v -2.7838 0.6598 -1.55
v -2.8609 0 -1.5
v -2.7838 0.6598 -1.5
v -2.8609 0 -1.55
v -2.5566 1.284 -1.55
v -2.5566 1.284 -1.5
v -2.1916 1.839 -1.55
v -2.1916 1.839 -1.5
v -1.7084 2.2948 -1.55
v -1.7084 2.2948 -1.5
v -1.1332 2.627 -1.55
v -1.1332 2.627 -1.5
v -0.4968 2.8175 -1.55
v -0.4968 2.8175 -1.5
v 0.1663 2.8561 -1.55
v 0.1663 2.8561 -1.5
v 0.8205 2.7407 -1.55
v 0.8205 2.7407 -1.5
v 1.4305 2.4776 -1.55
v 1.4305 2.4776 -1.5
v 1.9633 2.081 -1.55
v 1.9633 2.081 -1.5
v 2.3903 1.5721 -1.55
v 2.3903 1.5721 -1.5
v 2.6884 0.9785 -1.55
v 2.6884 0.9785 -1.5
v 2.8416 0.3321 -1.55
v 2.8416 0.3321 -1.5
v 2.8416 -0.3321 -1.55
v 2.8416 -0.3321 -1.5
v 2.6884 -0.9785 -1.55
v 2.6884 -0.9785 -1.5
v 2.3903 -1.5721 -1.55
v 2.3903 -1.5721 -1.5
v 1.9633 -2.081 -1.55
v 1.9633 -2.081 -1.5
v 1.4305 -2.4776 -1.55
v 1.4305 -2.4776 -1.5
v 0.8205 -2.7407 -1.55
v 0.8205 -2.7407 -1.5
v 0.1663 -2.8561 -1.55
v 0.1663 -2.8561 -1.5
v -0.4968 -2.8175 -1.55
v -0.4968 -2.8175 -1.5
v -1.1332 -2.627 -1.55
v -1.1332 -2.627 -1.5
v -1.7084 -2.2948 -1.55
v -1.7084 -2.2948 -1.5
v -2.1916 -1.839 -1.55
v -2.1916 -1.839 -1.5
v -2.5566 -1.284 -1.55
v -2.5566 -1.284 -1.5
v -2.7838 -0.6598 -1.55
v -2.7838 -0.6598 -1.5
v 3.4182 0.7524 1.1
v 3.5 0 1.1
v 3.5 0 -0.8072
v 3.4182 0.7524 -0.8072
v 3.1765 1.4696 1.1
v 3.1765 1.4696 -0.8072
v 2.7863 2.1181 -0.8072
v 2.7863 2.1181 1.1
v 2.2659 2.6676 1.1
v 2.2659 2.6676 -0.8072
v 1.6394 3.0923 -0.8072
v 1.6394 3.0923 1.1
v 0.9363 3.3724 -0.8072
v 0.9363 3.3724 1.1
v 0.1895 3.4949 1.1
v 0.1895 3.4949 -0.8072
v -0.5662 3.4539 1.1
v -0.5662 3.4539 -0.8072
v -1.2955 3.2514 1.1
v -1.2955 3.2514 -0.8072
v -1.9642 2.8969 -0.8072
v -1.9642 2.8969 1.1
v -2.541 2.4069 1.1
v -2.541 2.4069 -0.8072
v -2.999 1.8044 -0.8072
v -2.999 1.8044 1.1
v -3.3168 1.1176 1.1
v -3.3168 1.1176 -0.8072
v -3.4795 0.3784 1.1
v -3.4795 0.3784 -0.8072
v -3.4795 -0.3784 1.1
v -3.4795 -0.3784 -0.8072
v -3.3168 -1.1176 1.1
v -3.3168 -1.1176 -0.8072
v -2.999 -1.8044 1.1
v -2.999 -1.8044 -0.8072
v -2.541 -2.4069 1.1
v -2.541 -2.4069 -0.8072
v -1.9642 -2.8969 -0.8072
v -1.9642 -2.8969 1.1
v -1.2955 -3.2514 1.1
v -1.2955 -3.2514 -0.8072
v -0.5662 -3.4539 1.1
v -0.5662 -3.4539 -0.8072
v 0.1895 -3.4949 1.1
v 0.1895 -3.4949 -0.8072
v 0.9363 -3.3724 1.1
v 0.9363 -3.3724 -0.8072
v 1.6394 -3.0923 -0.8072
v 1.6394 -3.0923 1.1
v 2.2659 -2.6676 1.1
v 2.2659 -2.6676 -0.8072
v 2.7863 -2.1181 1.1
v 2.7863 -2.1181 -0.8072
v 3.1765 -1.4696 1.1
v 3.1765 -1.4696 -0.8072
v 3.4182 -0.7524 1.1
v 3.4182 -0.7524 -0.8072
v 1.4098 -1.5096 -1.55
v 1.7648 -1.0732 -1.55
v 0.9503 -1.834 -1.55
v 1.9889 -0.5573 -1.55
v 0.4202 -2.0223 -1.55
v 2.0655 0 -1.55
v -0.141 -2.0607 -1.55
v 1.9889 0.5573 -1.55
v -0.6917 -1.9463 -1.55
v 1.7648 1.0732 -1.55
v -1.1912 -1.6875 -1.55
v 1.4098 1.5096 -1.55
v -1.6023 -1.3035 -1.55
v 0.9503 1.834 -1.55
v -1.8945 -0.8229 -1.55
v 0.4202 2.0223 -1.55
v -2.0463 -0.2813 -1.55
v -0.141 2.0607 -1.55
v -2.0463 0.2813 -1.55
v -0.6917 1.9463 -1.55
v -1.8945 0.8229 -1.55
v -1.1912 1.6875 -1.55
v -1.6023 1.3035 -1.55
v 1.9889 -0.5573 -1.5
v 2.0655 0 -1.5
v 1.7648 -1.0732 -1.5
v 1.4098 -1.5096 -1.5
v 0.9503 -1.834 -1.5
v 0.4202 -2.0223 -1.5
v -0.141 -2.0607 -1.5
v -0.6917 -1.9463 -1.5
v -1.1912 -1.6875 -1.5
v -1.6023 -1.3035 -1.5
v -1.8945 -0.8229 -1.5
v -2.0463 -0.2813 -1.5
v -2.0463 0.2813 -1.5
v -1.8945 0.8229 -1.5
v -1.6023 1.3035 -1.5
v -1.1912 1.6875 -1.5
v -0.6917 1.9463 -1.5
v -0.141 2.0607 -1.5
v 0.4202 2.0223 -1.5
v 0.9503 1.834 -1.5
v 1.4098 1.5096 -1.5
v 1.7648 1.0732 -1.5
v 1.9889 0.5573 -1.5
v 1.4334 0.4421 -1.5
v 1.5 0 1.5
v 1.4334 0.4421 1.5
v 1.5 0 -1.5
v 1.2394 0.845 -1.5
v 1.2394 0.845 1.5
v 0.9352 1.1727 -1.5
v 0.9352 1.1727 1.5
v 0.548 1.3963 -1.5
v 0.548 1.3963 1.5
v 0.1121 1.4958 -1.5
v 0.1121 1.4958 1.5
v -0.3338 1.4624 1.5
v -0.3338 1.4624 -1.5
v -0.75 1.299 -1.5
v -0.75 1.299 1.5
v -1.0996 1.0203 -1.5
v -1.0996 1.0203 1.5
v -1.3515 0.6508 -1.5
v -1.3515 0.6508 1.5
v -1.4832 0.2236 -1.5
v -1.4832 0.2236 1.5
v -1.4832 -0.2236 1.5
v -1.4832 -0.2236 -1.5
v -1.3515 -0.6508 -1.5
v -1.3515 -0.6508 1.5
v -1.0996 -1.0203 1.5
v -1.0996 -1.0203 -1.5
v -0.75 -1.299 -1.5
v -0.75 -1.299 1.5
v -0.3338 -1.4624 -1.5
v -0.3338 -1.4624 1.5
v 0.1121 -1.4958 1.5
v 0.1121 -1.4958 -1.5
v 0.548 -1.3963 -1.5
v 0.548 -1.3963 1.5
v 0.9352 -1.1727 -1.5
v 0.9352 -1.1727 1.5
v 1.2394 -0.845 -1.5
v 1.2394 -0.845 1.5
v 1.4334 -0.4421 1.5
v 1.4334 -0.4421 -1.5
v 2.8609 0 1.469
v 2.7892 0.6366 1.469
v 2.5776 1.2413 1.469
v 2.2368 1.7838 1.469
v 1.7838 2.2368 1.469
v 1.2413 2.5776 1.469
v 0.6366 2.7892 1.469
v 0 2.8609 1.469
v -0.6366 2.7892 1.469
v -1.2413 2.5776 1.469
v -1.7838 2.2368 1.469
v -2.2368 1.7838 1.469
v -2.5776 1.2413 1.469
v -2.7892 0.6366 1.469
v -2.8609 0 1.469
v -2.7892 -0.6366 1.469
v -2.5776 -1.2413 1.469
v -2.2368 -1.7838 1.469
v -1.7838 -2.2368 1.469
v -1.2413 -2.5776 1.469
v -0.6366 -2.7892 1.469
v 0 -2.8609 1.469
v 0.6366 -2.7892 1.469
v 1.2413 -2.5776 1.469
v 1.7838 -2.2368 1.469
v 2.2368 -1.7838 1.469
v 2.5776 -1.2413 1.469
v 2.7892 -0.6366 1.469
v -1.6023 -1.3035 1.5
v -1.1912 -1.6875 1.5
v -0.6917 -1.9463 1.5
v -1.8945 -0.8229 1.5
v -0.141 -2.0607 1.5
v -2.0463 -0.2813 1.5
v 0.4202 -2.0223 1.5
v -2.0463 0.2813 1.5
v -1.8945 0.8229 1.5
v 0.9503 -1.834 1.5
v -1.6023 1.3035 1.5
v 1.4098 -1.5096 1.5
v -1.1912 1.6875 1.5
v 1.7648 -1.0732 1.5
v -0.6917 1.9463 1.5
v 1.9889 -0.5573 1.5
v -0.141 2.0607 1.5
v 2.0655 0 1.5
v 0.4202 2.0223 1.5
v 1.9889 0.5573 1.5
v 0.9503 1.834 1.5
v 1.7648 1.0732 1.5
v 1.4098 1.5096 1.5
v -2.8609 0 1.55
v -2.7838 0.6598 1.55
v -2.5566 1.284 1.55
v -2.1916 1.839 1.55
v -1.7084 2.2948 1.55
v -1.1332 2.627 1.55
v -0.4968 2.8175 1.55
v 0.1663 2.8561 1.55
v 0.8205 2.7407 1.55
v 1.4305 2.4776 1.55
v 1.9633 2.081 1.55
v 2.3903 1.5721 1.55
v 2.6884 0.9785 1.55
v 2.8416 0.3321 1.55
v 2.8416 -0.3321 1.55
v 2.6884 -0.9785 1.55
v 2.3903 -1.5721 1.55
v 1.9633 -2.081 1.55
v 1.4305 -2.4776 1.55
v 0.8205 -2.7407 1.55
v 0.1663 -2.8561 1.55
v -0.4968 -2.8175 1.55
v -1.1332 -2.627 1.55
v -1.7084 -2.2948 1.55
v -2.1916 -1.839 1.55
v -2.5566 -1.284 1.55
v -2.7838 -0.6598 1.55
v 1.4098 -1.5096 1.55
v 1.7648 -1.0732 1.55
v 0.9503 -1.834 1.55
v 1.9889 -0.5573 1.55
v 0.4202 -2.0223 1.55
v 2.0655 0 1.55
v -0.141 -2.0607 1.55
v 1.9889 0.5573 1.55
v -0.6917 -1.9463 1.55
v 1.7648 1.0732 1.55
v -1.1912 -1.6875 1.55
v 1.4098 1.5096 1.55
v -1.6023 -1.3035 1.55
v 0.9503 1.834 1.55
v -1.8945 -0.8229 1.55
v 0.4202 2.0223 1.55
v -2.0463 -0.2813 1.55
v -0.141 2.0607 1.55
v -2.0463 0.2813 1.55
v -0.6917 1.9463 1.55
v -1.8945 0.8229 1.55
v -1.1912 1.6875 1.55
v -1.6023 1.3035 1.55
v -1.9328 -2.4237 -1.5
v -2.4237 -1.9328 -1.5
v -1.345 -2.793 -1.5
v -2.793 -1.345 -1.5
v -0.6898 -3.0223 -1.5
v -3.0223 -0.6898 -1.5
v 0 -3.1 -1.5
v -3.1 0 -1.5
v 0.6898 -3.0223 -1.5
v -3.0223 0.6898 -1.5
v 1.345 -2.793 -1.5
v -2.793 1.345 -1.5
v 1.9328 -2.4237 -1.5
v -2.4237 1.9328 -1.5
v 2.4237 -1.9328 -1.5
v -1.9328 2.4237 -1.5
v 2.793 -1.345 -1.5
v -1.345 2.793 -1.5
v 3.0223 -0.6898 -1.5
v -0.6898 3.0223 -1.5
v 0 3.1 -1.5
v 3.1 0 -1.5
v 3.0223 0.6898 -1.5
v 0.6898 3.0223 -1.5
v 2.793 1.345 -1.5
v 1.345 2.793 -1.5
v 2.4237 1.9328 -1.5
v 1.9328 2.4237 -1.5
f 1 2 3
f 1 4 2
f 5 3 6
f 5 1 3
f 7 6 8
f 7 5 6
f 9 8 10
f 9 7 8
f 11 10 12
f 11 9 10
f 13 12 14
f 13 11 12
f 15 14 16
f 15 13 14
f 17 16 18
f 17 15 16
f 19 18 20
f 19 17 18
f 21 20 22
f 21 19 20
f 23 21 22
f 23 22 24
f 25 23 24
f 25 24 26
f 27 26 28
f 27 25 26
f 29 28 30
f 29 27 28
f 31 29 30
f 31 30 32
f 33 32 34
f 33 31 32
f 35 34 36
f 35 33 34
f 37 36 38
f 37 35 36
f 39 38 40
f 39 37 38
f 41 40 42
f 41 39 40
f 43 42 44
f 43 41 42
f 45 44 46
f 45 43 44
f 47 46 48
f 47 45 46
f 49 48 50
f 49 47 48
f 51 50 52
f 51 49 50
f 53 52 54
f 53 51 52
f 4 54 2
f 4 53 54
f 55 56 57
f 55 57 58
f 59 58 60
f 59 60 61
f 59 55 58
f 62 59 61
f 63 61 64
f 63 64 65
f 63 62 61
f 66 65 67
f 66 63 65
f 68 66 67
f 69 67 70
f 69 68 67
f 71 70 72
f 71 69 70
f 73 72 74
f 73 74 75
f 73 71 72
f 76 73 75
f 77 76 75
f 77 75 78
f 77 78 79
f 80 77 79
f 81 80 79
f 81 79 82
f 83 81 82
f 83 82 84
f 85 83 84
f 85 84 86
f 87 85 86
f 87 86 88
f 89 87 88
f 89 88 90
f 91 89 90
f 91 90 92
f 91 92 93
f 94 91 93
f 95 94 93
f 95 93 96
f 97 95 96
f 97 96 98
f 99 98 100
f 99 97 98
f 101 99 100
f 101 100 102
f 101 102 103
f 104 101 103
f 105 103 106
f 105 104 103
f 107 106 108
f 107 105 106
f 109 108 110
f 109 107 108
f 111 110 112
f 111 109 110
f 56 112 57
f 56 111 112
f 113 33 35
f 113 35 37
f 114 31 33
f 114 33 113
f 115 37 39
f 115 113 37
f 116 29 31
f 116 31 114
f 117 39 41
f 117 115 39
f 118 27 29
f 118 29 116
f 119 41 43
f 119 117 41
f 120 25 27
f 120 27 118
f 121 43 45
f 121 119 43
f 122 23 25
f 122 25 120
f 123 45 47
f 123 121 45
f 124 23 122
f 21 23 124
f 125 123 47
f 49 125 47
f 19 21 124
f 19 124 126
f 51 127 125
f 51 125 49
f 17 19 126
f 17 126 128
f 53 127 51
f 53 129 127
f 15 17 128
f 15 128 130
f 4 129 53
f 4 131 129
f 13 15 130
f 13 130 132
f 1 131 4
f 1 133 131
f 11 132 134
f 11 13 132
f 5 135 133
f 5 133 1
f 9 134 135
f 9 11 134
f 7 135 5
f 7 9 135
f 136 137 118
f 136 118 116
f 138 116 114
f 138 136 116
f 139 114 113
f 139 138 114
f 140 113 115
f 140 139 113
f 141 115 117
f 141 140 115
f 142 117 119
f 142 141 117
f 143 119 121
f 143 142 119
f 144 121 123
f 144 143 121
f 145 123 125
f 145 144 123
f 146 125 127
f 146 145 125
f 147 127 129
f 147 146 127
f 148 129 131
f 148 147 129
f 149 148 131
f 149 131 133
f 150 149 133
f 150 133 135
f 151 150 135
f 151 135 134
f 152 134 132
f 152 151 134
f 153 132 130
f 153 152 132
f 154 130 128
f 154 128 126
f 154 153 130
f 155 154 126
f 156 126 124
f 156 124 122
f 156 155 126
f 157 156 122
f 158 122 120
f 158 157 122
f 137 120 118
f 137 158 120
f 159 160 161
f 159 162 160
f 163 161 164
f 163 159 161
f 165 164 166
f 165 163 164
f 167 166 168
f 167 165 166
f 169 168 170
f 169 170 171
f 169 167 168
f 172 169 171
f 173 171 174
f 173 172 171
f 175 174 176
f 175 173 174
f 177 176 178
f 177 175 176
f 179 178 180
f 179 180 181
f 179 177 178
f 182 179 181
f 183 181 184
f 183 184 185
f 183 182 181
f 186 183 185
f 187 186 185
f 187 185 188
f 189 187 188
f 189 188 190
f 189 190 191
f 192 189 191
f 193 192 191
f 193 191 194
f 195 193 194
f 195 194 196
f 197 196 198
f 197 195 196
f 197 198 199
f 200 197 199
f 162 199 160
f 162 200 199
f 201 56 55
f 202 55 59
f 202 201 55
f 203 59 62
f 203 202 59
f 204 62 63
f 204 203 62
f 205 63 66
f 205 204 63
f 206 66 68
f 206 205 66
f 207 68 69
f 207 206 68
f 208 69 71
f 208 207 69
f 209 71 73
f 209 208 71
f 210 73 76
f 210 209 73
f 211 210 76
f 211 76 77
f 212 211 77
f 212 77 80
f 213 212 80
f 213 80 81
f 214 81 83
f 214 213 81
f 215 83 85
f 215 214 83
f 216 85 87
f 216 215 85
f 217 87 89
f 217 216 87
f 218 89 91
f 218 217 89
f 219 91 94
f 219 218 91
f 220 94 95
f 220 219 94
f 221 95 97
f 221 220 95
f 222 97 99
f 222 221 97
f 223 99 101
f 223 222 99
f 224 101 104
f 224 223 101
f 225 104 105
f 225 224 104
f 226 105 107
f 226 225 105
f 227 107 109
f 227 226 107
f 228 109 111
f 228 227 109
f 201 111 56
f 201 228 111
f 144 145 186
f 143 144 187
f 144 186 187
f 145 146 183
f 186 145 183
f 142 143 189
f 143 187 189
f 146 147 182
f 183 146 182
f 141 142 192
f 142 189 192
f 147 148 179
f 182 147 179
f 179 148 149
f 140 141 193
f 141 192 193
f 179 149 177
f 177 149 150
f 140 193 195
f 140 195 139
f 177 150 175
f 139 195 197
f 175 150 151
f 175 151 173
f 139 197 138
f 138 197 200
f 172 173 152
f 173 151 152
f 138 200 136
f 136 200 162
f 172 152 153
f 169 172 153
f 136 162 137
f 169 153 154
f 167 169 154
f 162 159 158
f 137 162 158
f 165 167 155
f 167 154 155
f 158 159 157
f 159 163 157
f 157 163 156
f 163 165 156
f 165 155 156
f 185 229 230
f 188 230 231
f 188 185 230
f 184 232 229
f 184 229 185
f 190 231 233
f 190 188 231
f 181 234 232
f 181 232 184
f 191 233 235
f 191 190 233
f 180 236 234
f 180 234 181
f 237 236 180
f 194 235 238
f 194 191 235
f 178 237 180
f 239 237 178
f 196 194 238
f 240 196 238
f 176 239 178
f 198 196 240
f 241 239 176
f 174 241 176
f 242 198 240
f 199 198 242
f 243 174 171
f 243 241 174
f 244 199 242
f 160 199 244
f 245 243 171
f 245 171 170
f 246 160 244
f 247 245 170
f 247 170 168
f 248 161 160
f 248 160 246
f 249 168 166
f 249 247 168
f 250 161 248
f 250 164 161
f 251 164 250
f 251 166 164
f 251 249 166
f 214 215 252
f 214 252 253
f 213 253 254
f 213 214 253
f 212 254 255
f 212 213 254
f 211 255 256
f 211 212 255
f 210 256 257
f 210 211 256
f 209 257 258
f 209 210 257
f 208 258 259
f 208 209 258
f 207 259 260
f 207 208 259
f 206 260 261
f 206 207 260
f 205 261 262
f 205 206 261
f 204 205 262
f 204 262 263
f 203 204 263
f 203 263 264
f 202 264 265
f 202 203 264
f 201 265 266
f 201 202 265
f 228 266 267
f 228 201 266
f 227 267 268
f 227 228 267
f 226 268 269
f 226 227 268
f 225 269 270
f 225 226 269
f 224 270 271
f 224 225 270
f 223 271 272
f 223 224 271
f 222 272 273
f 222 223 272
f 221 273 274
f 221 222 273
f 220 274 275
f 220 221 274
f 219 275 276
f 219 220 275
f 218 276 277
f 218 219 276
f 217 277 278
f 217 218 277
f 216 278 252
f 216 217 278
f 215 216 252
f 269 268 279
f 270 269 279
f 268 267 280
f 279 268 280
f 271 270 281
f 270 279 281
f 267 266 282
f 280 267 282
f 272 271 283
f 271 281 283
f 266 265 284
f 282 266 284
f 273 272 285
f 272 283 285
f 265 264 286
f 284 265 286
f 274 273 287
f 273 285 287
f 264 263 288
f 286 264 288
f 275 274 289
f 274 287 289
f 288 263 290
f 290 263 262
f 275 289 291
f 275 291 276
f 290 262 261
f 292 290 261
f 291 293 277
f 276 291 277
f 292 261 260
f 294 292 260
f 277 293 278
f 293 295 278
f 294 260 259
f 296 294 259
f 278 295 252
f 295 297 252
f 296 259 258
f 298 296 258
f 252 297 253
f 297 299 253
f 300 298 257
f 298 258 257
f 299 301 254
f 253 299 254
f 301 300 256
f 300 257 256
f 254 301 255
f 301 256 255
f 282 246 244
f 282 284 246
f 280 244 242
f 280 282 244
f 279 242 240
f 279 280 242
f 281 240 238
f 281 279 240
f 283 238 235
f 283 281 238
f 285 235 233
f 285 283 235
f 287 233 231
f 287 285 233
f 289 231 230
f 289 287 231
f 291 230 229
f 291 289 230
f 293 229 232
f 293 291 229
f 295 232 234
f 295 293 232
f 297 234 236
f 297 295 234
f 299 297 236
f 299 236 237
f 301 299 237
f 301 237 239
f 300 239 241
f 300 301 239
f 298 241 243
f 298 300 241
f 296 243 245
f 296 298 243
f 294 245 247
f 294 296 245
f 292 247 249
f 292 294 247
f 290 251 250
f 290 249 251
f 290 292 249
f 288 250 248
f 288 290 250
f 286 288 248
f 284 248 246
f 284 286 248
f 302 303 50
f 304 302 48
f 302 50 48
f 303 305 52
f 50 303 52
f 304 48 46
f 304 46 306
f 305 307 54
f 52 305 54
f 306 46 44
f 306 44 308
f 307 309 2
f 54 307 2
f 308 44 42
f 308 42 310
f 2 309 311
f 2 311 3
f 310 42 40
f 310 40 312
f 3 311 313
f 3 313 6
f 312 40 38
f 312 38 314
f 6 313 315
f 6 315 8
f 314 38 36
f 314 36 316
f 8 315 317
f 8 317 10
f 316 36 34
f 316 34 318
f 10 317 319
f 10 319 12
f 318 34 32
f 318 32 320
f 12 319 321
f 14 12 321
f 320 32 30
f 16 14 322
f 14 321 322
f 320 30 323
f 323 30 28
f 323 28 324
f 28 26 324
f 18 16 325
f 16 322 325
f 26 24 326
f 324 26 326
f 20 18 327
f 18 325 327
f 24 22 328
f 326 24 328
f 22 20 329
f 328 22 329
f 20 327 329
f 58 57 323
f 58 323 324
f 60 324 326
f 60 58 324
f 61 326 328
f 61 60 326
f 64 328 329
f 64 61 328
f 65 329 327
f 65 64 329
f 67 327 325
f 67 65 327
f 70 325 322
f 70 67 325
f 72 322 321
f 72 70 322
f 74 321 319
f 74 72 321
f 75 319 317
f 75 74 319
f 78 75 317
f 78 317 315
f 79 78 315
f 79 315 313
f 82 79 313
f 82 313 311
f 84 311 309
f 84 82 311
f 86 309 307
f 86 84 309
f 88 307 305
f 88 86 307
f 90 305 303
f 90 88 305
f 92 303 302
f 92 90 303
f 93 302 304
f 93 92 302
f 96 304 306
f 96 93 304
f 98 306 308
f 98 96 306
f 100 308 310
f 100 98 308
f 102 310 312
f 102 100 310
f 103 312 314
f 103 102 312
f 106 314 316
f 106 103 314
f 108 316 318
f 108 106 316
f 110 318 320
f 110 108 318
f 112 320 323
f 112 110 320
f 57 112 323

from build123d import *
from OCP.BRepFilletAPI import BRepFilletAPI_MakeChamfer

# Parameters (mm, degrees)
CROQUIS1_R              = 3.5
CROQUIS1_R_2            = 1.5
SALIENTE_EXTRUIR1_DEPTH = 1.5
CHAFL_N1_SIZE           = 0.4
CHAFL_N1_SIZE2          = 0.692820323
CROQUIS2_R              = 2.860932506
CROQUIS2_R_2            = 2.065541469
SALIENTE_EXTRUIR2_DEPTH = 1.55


with BuildPart() as part:
    # Croquis1 → Saliente-Extruir1 (new, symmetric)
    with BuildSketch(Plane.XY):
        Circle(CROQUIS1_R)
        Circle(CROQUIS1_R_2, mode=Mode.SUBTRACT)
    extrude(amount=SALIENTE_EXTRUIR1_DEPTH, both=True)

    # Chaflán1: one chamfer whose edges measure the first distance from different faces: ONE call of the kernel's chamfer builder (chamfer() names one face for all edges)
    chafl_n1_edges_1 = [part.edges().sort_by_distance(p)[0] for p in [
        (-3.5, 0, -1.5),
    ]]
    chafl_n1_side_1 = [part.faces().sort_by_distance(p)[0] for p in [
        (-3.401005051, 0, -1.5),
    ]]
    chafl_n1_edges_2 = [part.edges().sort_by_distance(p)[0] for p in [
        (-3.5, 0, 1.5),
    ]]
    chafl_n1_side_2 = [part.faces().sort_by_distance(p)[0] for p in [
        (-3.5, 0, 0),
    ]]
    chafl_n1 = BRepFilletAPI_MakeChamfer(part.part.solid().wrapped)
    for e in chafl_n1_edges_1:
        chafl_n1.Add(CHAFL_N1_SIZE, CHAFL_N1_SIZE2, e.wrapped, chafl_n1_side_1[0].wrapped)  # the first distance lies on this face
    for e in chafl_n1_edges_2:
        chafl_n1.Add(CHAFL_N1_SIZE, CHAFL_N1_SIZE2, e.wrapped, chafl_n1_side_2[0].wrapped)  # the first distance lies on this face
    add(Compound.cast(chafl_n1.Shape()), mode=Mode.REPLACE)

    # Croquis2 → Saliente-Extruir2 (add, symmetric)
    with BuildSketch(Plane(origin=(0, 0, 0), x_dir=(-1, 0, 0), z_dir=(0, 0, -1))):
        Circle(CROQUIS2_R)
        with Locations(Location((0, 0, 0), (0, 0, 180))):
            Circle(CROQUIS2_R_2, mode=Mode.SUBTRACT)
    extrude(amount=SALIENTE_EXTRUIR2_DEPTH, both=True)


solid = part.part
